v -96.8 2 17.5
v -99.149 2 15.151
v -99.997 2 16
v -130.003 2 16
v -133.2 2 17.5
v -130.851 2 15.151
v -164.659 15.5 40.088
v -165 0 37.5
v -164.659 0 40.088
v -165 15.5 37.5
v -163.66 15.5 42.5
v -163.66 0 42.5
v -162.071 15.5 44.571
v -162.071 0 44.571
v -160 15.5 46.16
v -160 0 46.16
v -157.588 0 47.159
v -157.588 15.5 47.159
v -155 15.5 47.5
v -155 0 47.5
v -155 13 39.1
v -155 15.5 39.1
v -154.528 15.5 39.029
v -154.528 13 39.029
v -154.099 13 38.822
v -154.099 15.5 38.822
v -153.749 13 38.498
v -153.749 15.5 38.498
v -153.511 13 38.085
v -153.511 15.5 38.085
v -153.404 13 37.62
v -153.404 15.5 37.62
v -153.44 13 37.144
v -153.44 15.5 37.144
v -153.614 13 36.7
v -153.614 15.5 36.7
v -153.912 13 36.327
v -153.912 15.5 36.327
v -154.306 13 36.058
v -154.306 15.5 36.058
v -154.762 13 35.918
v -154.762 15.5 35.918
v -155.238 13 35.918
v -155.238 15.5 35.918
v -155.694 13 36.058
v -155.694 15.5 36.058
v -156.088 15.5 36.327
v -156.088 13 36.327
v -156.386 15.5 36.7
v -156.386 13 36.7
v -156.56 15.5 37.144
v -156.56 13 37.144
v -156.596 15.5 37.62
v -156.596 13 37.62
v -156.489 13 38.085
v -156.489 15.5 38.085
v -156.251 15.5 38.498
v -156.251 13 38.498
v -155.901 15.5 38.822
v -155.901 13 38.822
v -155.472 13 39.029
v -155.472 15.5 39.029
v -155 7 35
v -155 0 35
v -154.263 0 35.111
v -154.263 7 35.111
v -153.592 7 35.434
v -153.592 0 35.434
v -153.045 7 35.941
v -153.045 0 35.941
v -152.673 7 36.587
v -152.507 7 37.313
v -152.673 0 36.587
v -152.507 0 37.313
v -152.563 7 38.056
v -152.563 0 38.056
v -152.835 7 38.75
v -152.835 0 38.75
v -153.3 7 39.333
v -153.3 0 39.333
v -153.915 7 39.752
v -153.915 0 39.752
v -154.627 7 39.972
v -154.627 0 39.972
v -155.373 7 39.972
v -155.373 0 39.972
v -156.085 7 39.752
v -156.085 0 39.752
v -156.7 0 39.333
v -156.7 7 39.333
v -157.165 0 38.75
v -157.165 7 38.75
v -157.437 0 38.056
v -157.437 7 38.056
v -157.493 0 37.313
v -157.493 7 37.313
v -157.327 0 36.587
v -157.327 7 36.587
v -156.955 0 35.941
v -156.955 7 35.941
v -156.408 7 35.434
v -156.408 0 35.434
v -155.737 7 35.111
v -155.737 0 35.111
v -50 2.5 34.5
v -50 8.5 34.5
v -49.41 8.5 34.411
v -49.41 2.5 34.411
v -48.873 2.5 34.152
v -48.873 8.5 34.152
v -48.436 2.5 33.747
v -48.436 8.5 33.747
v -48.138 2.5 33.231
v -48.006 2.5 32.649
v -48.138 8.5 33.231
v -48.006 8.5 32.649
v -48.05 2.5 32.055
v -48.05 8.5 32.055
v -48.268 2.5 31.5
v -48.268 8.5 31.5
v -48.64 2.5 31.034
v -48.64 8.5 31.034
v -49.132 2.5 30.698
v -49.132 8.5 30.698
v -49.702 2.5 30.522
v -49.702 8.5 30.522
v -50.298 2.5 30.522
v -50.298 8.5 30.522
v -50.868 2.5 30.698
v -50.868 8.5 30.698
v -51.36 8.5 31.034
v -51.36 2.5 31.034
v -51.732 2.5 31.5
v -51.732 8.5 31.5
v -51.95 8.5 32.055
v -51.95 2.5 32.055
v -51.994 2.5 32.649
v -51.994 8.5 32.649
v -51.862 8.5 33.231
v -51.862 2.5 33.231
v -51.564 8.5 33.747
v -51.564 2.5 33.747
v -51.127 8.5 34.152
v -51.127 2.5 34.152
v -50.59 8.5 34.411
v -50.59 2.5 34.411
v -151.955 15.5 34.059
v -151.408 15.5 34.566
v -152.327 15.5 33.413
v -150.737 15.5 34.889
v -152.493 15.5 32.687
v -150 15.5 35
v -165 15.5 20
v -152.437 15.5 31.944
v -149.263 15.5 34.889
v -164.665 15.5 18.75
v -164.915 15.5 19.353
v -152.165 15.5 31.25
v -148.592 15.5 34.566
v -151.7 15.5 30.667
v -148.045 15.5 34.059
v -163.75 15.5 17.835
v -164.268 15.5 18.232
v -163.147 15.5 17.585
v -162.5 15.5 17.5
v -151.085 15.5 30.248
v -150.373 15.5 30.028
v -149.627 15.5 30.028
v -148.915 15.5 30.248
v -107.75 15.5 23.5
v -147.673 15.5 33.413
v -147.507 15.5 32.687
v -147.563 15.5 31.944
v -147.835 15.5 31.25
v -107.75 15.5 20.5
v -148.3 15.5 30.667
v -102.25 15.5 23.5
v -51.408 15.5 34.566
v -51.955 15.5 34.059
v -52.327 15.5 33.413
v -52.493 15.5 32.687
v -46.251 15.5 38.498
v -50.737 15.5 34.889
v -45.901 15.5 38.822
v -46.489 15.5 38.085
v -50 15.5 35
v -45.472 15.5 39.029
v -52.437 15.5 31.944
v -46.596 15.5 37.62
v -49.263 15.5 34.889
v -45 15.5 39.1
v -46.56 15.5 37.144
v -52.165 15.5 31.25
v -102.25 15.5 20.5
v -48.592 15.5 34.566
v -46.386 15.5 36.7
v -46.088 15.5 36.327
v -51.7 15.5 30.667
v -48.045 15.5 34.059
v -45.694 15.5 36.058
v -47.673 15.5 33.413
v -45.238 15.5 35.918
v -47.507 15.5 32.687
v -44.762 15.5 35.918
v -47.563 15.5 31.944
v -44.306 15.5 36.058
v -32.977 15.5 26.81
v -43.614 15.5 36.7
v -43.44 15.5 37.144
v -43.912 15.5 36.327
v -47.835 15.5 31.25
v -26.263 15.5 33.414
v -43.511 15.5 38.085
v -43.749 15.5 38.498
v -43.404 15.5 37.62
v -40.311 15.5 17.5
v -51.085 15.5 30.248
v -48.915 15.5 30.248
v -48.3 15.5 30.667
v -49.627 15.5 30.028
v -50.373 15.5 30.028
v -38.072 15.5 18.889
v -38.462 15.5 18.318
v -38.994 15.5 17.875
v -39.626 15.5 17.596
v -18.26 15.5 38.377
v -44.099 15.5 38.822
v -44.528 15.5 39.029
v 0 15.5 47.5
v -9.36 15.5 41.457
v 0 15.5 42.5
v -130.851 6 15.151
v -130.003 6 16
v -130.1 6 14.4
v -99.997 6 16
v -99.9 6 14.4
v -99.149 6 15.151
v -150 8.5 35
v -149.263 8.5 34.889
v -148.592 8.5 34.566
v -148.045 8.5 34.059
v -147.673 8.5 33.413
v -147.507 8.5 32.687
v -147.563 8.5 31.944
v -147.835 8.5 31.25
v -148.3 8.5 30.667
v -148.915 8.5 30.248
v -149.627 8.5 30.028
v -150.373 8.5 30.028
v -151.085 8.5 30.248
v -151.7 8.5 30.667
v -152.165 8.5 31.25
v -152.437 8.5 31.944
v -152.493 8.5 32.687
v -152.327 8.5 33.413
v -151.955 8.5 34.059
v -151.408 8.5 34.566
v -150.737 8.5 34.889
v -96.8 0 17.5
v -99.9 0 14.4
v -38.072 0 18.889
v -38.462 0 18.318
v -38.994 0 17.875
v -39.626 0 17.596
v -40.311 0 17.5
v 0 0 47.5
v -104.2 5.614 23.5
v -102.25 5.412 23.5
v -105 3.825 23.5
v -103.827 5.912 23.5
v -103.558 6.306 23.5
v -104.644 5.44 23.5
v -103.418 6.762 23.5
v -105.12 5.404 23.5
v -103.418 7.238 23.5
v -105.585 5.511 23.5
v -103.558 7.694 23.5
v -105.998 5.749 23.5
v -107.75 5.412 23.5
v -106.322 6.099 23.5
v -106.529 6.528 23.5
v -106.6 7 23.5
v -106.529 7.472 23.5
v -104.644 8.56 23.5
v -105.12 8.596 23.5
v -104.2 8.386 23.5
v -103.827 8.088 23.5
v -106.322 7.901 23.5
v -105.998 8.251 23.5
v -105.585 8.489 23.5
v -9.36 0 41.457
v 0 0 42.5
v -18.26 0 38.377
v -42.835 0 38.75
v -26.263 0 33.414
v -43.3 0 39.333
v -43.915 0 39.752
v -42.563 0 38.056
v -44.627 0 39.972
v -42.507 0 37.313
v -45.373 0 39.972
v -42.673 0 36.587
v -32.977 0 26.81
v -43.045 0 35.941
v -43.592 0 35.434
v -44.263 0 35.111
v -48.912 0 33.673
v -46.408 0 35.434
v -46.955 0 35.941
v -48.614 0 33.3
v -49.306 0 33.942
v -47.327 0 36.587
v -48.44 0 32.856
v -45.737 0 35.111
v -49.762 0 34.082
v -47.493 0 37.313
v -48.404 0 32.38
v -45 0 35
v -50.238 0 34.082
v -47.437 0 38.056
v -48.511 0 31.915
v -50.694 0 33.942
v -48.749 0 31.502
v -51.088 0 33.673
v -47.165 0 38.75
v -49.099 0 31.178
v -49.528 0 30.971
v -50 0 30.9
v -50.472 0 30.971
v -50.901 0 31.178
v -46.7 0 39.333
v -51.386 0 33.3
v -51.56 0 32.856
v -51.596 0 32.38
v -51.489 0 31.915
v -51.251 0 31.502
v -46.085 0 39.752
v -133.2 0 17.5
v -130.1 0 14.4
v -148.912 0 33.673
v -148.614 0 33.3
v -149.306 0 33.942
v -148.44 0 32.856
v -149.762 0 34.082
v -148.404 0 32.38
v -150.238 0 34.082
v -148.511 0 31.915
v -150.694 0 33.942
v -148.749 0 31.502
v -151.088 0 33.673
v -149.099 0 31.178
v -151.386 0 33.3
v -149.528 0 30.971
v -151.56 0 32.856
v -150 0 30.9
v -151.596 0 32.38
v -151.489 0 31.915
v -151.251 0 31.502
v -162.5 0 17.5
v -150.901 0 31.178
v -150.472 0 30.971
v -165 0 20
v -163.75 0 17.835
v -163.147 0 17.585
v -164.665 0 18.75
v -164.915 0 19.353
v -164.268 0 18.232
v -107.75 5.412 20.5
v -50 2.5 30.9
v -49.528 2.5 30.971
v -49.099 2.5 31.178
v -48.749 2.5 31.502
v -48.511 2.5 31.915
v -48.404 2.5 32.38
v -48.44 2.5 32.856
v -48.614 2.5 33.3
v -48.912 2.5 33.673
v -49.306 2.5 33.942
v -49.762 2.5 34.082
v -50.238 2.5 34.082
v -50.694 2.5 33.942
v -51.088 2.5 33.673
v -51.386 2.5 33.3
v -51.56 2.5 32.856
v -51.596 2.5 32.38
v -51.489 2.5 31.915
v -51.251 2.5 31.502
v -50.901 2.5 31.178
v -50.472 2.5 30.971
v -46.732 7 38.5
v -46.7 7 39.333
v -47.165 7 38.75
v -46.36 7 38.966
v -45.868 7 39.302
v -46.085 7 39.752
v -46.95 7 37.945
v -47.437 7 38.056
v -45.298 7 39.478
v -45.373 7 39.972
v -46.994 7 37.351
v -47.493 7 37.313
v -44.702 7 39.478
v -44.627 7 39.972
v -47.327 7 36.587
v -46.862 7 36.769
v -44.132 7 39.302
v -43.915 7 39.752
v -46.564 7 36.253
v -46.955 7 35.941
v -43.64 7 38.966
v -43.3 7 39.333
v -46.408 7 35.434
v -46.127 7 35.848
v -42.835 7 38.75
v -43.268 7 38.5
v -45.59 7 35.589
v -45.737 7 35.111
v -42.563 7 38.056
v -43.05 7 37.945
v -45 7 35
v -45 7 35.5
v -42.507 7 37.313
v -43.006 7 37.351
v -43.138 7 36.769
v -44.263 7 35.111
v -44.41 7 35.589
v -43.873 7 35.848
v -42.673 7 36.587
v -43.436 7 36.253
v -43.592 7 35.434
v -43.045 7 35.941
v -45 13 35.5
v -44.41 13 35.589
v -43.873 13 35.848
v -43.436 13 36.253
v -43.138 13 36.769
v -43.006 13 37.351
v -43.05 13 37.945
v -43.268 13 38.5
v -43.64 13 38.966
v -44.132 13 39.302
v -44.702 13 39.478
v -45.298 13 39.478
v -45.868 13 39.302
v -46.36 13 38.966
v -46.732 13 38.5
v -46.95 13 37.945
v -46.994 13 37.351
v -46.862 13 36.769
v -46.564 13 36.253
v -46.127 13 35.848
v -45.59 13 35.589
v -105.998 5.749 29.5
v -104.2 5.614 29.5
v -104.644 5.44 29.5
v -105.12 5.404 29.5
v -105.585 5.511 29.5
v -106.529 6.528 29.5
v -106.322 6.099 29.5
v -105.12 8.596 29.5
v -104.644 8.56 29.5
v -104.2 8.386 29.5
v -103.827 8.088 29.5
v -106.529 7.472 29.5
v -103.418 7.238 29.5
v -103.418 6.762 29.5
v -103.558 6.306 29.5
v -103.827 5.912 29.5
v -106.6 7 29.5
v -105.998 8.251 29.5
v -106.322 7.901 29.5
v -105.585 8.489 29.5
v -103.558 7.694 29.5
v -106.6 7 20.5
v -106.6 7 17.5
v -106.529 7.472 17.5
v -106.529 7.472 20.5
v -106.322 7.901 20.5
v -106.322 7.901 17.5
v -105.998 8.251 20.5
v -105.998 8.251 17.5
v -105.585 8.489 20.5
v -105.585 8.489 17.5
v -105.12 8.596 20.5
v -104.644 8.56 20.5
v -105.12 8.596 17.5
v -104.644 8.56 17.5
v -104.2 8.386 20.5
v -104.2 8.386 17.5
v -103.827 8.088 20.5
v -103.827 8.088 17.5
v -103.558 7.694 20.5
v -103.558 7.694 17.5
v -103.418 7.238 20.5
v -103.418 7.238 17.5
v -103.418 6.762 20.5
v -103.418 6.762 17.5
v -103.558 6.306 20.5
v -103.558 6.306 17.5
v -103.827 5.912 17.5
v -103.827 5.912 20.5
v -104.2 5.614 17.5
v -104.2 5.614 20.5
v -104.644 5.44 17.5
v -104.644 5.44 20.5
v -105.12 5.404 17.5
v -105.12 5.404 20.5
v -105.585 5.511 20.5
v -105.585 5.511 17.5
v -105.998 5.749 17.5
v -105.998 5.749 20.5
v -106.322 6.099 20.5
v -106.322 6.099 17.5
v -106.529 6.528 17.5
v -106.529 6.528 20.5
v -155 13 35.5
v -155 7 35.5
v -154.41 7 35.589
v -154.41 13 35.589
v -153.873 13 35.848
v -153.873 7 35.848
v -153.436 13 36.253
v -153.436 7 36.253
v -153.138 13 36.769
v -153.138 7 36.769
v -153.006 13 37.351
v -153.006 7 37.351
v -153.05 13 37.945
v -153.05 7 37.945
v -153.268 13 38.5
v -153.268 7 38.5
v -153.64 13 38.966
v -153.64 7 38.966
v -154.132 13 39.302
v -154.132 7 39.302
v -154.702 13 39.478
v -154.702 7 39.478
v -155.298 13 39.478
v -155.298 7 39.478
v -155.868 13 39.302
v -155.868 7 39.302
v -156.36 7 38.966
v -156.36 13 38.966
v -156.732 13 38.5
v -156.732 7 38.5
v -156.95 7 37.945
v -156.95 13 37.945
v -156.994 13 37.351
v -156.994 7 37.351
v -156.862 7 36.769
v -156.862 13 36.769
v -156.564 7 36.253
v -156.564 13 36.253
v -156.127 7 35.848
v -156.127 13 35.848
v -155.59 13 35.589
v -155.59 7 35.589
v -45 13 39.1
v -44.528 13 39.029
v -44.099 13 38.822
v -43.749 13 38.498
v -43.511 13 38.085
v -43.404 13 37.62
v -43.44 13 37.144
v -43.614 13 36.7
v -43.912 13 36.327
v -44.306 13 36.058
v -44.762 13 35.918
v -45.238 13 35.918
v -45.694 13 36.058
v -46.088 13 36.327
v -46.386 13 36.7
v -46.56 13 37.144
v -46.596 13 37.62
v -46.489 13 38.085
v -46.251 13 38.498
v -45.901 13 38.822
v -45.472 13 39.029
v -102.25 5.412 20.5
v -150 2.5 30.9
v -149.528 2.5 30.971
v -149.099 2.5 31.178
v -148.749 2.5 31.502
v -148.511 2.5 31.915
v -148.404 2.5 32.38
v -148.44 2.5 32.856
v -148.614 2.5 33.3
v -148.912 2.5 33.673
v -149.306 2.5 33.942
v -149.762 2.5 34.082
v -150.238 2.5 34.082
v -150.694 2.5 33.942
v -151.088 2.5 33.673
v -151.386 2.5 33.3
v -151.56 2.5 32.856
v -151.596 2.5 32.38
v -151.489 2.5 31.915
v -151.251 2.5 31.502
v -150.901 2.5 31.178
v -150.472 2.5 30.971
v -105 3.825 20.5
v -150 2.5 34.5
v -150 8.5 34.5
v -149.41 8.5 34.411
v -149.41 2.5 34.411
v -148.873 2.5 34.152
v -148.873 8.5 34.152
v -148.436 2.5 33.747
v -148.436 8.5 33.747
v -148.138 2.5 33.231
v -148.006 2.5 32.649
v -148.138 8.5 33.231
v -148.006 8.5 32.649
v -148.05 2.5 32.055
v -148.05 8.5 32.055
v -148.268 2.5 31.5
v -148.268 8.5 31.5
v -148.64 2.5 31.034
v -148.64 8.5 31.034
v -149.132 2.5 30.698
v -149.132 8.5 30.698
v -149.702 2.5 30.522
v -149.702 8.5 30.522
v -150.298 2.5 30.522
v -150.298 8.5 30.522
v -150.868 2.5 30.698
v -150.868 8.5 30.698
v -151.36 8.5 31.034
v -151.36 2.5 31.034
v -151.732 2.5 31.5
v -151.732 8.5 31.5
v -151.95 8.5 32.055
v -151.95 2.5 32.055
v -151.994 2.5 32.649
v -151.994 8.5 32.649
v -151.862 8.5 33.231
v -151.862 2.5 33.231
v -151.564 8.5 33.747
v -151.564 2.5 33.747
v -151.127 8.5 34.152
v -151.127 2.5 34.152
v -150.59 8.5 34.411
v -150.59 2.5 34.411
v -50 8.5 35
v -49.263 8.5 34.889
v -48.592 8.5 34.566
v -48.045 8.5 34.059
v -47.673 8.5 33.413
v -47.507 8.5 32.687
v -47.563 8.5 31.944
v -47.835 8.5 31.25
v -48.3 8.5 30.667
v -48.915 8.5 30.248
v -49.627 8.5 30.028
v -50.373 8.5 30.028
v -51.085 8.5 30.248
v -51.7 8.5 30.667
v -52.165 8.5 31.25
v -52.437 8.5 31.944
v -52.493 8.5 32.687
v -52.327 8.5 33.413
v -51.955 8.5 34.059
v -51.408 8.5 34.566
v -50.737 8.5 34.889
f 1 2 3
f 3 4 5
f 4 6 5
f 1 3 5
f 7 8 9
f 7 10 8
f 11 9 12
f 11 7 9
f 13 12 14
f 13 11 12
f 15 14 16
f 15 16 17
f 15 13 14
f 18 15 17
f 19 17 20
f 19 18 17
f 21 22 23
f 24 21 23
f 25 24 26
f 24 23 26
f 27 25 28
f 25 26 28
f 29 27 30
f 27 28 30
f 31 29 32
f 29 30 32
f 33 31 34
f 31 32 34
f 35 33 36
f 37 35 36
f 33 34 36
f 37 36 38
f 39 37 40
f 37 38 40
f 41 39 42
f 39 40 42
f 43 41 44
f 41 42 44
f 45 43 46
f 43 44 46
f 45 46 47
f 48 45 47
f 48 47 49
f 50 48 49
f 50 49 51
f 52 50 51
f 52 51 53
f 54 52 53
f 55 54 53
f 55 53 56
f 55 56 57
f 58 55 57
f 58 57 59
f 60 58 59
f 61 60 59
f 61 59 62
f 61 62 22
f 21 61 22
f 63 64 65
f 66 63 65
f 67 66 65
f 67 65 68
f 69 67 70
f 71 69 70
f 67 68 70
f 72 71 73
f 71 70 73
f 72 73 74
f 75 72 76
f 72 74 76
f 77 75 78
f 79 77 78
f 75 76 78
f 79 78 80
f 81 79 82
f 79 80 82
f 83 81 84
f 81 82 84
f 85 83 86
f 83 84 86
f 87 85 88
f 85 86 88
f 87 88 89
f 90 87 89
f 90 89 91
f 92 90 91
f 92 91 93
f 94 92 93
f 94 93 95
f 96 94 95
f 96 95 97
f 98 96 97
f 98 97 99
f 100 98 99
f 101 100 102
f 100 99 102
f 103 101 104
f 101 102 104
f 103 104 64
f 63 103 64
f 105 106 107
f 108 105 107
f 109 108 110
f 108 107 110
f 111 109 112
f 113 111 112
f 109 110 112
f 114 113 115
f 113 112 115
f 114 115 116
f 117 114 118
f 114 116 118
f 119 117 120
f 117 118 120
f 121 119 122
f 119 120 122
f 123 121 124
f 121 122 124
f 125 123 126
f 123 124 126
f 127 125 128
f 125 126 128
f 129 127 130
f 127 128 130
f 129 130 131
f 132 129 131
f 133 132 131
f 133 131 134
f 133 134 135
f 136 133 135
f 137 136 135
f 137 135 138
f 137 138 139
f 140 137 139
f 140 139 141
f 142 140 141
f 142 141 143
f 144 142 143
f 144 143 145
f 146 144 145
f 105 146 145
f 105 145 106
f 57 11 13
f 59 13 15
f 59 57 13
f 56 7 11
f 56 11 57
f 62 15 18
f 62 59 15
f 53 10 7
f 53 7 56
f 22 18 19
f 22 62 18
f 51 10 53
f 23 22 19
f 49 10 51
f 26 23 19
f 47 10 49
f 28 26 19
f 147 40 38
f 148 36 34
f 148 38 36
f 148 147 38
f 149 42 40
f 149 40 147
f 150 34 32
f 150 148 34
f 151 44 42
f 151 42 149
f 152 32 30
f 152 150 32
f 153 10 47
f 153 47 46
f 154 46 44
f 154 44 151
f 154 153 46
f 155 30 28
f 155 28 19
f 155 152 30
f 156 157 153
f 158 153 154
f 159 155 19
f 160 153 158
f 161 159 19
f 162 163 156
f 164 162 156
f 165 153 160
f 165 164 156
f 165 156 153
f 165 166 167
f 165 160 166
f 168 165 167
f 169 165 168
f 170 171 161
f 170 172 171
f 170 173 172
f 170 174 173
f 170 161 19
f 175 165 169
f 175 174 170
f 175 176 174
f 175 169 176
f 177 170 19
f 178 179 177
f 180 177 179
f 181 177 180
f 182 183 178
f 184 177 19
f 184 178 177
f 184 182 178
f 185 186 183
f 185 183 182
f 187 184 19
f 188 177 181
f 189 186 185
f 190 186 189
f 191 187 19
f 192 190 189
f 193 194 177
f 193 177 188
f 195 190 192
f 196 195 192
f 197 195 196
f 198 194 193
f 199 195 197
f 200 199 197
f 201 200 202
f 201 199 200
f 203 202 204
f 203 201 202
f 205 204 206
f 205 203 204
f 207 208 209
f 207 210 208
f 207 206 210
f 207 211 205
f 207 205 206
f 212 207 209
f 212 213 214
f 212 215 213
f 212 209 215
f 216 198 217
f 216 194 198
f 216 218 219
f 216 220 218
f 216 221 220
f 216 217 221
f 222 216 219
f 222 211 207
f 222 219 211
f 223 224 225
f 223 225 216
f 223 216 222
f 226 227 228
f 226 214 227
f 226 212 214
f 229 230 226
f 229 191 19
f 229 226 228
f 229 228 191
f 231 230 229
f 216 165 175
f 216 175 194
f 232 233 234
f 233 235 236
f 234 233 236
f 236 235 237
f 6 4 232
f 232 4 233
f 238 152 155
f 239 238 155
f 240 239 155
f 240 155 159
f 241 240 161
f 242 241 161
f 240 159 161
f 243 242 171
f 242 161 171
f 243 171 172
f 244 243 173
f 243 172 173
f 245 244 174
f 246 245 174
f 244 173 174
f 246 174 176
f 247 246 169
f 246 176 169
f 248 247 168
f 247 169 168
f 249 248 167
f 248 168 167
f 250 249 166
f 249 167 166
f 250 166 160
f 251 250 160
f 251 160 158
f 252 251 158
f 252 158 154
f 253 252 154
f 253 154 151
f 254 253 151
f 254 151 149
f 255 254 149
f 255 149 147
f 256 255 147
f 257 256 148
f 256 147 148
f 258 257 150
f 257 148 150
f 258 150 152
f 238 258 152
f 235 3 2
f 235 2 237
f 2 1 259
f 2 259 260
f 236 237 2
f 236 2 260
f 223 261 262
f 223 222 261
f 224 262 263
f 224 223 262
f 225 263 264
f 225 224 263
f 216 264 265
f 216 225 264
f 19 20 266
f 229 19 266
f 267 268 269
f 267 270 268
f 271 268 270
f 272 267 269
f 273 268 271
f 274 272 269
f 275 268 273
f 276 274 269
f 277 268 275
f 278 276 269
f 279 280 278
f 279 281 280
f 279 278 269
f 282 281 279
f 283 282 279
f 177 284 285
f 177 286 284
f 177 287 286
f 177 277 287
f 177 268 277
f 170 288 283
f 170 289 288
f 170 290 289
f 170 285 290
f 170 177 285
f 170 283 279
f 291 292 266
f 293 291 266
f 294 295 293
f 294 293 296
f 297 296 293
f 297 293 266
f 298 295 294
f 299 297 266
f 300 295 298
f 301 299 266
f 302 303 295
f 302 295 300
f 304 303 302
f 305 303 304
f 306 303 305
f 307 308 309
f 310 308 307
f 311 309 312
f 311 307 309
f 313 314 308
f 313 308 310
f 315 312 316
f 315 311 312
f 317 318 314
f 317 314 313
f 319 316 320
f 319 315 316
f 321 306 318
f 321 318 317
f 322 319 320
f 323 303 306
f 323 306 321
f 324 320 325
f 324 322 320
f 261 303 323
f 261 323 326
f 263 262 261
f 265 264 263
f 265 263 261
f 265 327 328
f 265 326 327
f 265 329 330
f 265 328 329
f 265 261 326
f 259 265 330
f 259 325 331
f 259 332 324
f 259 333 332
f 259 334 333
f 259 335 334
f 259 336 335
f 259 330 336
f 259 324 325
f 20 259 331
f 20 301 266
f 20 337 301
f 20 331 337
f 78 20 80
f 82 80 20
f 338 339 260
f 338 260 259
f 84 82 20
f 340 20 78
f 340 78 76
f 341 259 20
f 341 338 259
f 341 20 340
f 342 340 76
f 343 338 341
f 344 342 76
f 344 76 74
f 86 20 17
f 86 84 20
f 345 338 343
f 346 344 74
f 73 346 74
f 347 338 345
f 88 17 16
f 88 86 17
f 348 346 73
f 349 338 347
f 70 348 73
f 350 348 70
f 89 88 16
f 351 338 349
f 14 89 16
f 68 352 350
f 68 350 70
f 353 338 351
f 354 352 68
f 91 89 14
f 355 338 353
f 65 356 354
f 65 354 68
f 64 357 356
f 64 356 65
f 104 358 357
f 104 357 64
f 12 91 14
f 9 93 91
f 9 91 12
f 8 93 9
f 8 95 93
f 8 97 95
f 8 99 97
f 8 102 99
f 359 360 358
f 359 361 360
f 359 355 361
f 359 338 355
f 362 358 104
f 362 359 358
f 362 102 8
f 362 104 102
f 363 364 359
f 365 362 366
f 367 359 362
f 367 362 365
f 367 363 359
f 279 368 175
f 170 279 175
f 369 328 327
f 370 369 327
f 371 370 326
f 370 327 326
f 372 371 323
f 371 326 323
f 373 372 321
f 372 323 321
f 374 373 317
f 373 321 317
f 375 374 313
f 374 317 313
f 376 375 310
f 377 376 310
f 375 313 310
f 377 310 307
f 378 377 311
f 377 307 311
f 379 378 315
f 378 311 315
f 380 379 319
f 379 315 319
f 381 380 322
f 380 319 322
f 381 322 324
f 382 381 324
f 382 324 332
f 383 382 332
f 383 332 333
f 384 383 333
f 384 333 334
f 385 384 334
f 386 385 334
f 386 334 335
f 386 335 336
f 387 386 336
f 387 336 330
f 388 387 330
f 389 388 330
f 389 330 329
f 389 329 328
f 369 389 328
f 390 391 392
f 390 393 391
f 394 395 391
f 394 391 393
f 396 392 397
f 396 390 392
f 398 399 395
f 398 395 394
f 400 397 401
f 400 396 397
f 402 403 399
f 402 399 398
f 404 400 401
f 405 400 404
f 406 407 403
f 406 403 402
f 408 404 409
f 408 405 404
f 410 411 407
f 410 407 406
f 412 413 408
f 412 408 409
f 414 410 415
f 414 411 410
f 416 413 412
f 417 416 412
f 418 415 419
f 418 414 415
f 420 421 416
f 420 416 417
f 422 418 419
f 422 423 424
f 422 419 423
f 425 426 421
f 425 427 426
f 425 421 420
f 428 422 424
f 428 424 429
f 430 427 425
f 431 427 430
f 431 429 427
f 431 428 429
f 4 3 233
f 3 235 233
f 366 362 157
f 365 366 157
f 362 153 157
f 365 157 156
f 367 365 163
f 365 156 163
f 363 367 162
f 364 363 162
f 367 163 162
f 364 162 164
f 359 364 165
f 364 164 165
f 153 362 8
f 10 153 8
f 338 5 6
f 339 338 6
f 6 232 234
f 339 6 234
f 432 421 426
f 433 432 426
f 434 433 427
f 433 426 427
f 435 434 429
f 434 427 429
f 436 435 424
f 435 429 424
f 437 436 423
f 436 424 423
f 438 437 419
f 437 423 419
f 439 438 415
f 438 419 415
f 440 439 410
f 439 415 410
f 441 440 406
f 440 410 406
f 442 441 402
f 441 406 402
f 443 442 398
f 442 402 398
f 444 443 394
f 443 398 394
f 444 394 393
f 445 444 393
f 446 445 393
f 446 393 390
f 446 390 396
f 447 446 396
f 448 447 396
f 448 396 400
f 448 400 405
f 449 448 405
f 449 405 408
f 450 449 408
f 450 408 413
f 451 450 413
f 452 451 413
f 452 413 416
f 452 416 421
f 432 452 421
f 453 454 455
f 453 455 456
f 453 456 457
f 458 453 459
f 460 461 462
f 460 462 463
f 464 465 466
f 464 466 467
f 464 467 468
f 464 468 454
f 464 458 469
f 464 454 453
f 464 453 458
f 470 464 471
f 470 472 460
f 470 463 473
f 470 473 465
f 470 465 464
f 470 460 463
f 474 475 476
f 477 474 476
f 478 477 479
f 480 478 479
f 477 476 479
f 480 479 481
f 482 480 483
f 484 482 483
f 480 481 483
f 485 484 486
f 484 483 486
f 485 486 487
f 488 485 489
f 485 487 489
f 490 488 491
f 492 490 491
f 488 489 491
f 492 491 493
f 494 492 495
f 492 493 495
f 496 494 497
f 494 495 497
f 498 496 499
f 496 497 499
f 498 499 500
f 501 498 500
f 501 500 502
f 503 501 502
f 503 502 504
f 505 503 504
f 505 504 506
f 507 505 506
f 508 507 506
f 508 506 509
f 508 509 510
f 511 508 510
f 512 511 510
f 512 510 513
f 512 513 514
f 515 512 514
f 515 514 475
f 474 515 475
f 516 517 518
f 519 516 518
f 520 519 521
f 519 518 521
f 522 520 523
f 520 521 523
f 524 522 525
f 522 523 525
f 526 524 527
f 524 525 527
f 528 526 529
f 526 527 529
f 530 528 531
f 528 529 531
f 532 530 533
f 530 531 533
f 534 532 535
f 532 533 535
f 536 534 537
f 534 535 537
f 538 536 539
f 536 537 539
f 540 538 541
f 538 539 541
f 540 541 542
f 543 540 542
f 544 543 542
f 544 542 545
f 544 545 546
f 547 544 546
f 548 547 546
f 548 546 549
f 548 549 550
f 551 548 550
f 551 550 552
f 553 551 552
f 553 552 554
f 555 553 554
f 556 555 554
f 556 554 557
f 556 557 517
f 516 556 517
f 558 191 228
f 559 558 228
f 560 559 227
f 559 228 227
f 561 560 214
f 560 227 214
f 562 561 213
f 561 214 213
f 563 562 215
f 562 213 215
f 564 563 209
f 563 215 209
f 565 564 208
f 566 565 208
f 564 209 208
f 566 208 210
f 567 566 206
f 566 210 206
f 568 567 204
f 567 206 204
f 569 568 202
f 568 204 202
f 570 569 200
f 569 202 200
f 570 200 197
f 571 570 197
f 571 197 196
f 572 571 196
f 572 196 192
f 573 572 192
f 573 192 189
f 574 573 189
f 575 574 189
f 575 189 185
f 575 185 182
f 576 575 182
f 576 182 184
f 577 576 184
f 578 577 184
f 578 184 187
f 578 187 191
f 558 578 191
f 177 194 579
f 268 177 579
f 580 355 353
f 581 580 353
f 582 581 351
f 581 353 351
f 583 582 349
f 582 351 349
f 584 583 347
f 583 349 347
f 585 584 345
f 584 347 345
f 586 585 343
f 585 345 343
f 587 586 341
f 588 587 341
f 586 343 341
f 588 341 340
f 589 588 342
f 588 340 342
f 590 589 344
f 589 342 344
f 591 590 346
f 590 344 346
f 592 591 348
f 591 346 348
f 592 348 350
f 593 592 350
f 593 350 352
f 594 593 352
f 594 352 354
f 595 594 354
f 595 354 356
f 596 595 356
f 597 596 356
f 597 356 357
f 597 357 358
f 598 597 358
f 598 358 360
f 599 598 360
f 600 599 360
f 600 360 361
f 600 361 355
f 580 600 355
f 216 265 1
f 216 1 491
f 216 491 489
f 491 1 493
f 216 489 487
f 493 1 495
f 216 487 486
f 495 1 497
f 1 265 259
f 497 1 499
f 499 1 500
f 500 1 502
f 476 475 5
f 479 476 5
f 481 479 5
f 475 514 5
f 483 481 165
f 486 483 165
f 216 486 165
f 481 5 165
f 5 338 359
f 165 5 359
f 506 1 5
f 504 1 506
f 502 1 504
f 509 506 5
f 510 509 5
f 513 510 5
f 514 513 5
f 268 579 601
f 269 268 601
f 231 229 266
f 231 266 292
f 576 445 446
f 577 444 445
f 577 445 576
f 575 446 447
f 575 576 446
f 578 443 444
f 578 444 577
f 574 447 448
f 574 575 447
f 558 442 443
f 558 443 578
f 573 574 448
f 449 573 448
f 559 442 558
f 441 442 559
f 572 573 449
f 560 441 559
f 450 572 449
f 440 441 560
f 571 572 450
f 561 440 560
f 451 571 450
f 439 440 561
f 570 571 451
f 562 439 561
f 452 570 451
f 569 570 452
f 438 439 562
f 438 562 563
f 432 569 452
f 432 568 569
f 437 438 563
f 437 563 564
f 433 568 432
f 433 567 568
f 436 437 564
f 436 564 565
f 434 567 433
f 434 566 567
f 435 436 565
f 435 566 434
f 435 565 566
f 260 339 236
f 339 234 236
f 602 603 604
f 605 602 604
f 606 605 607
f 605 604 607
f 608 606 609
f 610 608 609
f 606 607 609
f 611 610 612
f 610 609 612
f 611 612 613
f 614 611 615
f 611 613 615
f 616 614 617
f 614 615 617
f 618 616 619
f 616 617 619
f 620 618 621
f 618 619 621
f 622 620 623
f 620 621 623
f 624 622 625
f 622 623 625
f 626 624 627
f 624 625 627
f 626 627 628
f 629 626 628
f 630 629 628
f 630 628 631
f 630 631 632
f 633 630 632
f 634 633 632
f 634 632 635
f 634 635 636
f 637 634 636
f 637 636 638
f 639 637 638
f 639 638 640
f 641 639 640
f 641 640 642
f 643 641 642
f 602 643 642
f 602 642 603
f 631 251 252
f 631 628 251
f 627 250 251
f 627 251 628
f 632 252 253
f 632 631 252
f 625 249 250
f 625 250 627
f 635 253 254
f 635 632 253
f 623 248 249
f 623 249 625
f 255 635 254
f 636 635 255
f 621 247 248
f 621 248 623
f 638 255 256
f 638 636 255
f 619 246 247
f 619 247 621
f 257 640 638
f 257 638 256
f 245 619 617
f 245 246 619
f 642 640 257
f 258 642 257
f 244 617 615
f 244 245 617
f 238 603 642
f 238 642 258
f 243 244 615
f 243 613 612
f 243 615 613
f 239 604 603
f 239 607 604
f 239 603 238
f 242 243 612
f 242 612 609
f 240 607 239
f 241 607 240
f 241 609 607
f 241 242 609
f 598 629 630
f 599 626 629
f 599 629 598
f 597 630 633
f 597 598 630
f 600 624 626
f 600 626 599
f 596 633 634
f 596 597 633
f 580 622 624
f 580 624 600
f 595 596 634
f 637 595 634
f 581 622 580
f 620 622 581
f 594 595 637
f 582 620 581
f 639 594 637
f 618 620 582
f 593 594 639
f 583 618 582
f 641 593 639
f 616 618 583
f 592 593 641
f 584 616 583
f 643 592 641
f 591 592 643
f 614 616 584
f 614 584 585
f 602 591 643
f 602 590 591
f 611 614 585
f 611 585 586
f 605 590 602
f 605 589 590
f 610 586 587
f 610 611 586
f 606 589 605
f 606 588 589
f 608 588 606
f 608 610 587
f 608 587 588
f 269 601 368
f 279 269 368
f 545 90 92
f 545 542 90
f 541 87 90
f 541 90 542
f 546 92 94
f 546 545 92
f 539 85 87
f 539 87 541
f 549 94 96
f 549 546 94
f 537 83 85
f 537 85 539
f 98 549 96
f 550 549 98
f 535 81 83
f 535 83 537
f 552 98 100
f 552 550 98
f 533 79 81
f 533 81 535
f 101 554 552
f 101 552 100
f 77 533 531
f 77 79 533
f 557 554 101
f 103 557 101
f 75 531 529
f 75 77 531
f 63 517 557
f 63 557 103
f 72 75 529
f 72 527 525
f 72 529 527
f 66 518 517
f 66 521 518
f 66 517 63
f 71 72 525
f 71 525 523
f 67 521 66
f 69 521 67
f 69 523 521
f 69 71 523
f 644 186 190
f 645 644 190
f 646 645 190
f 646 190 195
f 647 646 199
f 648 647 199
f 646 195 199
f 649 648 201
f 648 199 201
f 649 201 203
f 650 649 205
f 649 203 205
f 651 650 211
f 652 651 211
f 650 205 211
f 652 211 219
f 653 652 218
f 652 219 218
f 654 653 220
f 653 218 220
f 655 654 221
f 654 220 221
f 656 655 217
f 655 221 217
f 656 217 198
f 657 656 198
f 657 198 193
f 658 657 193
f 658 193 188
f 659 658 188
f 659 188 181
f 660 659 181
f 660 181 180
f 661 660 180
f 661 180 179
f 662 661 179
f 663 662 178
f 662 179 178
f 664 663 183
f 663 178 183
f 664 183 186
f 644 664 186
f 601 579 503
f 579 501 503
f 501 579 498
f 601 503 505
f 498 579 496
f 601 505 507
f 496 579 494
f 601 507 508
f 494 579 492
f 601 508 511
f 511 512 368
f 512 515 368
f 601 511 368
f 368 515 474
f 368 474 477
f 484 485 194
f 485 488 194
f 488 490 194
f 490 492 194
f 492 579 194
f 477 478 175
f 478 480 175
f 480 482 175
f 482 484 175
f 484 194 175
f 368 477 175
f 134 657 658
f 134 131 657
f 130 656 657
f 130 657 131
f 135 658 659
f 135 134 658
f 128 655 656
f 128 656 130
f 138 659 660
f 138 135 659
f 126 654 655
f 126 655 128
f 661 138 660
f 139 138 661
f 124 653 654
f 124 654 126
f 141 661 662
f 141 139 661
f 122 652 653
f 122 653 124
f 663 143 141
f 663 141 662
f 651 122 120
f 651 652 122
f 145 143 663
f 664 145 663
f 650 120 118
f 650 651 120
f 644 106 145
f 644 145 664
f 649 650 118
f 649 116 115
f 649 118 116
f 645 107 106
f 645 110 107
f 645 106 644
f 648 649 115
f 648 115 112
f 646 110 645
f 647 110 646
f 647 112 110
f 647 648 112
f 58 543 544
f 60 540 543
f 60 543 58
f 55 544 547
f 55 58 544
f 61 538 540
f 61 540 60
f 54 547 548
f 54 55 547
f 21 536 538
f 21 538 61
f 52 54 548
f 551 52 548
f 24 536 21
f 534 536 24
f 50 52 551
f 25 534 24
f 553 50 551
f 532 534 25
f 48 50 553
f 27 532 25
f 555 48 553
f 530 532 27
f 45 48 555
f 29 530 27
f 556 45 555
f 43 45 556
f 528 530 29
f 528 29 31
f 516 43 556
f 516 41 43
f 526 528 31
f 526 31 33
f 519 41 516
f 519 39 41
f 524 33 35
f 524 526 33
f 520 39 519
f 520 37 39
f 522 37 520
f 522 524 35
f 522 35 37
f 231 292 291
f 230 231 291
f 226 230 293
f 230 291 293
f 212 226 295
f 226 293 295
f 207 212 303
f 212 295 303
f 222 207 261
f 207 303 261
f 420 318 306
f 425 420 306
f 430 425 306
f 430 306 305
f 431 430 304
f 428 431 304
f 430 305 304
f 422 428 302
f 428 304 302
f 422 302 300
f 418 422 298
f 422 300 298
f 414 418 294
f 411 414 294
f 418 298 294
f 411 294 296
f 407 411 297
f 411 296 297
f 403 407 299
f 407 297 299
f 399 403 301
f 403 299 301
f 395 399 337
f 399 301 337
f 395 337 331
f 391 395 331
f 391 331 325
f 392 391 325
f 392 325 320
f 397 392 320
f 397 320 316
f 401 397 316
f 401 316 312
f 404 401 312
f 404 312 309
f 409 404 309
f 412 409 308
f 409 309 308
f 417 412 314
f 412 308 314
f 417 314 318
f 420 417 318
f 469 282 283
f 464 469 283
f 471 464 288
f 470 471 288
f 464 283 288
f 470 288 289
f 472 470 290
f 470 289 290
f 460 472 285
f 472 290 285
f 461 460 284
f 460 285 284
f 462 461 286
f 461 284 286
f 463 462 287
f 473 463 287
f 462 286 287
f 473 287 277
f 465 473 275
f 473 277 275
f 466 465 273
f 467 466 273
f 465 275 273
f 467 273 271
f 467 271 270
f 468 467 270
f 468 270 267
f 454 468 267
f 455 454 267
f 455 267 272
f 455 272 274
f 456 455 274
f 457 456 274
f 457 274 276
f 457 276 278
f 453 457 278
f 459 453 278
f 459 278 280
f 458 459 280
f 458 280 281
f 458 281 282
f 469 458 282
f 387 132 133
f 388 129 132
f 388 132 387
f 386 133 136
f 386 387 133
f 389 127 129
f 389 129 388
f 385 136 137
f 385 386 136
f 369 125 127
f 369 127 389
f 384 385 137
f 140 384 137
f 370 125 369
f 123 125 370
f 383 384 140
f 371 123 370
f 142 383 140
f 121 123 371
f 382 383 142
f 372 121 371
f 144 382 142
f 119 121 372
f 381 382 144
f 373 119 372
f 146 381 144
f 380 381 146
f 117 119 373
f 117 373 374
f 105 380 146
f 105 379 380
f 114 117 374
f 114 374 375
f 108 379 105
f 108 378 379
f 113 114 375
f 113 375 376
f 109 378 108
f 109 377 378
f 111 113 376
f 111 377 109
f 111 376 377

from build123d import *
from OCP.BRepFilletAPI import BRepFilletAPI_MakeChamfer, BRepFilletAPI_MakeFillet

# Parameters (mm, degrees)
BOSS_EXTRU_1_DEPTH      = 15.5
BOSS_EXTRU_2_START      = -35
BOSS_EXTRU_2_DEPTH      = 30
CHANFREIN1_SIZE         = 3.2
CHANFREIN2_SIZE         = 1.2
CHANFREIN2_SIZE2        = 1.697056275
CONG_1_R1               = 10
CONG_1_R2               = 2.5
ENL_V_MAT_EXTRU_1_REACH = 174.399
ESQUISSE3_R             = 1.6
ESQUISSE4_R             = 2
ENL_V_MAT_EXTRU_2_DEPTH = 13
ESQUISSE9_R             = 2.5
ENL_V_MAT_EXTRU_7_DEPTH = 7
ENL_V_MAT_EXTRU_3_REACH = 174.399
ESQUISSE5_R             = 1.6
ESQUISSE6_R             = 2
ENL_V_MAT_EXTRU_4_DEPTH = 13
ESQUISSE10_R            = 2.5
ENL_V_MAT_EXTRU_8_DEPTH = 7
ESQUISSE7_R             = 1.6
ENL_V_MAT_EXTRU_5_DEPTH = 12
ENL_V_START             = -3
ENL_V_MAT_EXTRU_6_DEPTH = 3


with BuildPart() as part:
    # Esquisse1 → Boss.-Extru.1 (new body)
    with BuildSketch(Plane(origin=(0, 0, 0), x_dir=(1, 0, 0), z_dir=(0, 1, 0))):
        with BuildLine():
            ThreePointArc((0, -42.5), (-23.048861143, -35.707142143), (-38.729833462, -17.5))
            Line((-38.729833462, -17.5), (-165, -17.5))
            Line((-165, -17.5), (-165, -47.5))
            Line((-165, -47.5), (0, -47.5))
            Line((0, -47.5), (0, -42.5))
        make_face()
    extrude(amount=BOSS_EXTRU_1_DEPTH)

    # Esquisse11 → Boss.-Extru.2 (add)
    with BuildSketch(Plane.ZY.offset(165).offset(BOSS_EXTRU_2_START)):
        Polygon((17.5, 0), (14.4, 0), (14.4, 6), (16, 6), (16, 2), (17.5, 2), align=None)
    extrude(amount=-BOSS_EXTRU_2_DEPTH)

    # Chanfrein1
    # the kernel refuses this chamfer: 3.2 mm, written as the material it adds along each edge
    with BuildSketch(Plane(origin=(-100, 10.229385561, 17.5), x_dir=(0.9996219169112968, 0, 0.027495876610586226), z_dir=(0, -1, 0))) as chanfrein1_piece_1_section:
        Polygon((CHANFREIN1_SIZE * 0.999621916911, -CHANFREIN1_SIZE * 0.0274958766106), (-CHANFREIN1_SIZE * 0.0274958766106, -CHANFREIN1_SIZE * 0.999621916911), (0, 0), align=None)
    chanfrein1_piece_1 = extrude(amount=10.229385561, mode=Mode.PRIVATE)
    chanfrein1_piece_1 = split(chanfrein1_piece_1, bisect_by=Plane(origin=(-99.489179746, 2, 15.404286374), z_dir=(0, 1, 0)), keep=Keep.TOP, mode=Mode.PRIVATE)
    chanfrein1_piece_1 = split(chanfrein1_piece_1, bisect_by=Plane(origin=(-99.489179746, 4, 14.4), z_dir=(0, 0, 1)), keep=Keep.TOP, mode=Mode.PRIVATE)
    chanfrein1_piece_1 = split(chanfrein1_piece_1, bisect_by=Plane(origin=(-99.489179746, 6, 15.404286374), z_dir=(0, -1, 0)), keep=Keep.TOP, mode=Mode.PRIVATE)
    chanfrein1_piece_1 = split(chanfrein1_piece_1, bisect_by=Plane(origin=(-99.489179746, 4, 16), z_dir=(0, 0, -1)), keep=Keep.TOP, mode=Mode.PRIVATE)
    add(chanfrein1_piece_1)
    with BuildSketch(Plane(origin=(-100, 2, 17.5), x_dir=(0.9996219169112968, 0, 0.027495876610585147), z_dir=(0, -1, 0))) as chanfrein1_piece_2_section:
        Polygon((CHANFREIN1_SIZE * 0.999621916911, -CHANFREIN1_SIZE * 0.0274958766106), (-CHANFREIN1_SIZE * 0.0274958766106, -CHANFREIN1_SIZE * 0.999621916911), (0, 0), align=None)
    chanfrein1_piece_2 = extrude(amount=2, mode=Mode.PRIVATE)
    chanfrein1_piece_2 = split(chanfrein1_piece_2, bisect_by=Plane(origin=(-98.721329155, 1, 16), z_dir=(0, 0, 1)), keep=Keep.TOP, mode=Mode.PRIVATE)
    add(chanfrein1_piece_2)
    with BuildSketch(Plane(origin=(-100, 2, 17.5), x_dir=(0.9996219169112968, 0, 0.027495876610585147), z_dir=(0, -1, 0))) as chanfrein1_piece_3_section:
        Polygon((CHANFREIN1_SIZE * 0.999621916911, -CHANFREIN1_SIZE * 0.0274958766106), (-CHANFREIN1_SIZE * 0.0274958766106, -CHANFREIN1_SIZE * 0.999621916911), (0, 0), align=None)
    chanfrein1_piece_3 = extrude(amount=2, mode=Mode.PRIVATE)
    chanfrein1_piece_3 = split(chanfrein1_piece_3, bisect_by=Plane(origin=(-99.489179746, 1, 14.4), z_dir=(0, 0, 1)), keep=Keep.TOP, mode=Mode.PRIVATE)
    chanfrein1_piece_3 = split(chanfrein1_piece_3, bisect_by=Plane(origin=(-99.489179746, 1, 16), z_dir=(0, 0, -1)), keep=Keep.TOP, mode=Mode.PRIVATE)
    add(chanfrein1_piece_3)
    with BuildSketch(Plane(origin=(-130, 10.229385561, 17.5), x_dir=(-0.9996219169112966, 0, 0.02749587661058634), z_dir=(0, -1, 0))) as chanfrein1_piece_4_section:
        Polygon((CHANFREIN1_SIZE * 0.999621916911, CHANFREIN1_SIZE * 0.0274958766106), (-CHANFREIN1_SIZE * 0.0274958766106, CHANFREIN1_SIZE * 0.999621916911), (0, 0), align=None)
    chanfrein1_piece_4 = extrude(amount=10.229385561, mode=Mode.PRIVATE)
    chanfrein1_piece_4 = split(chanfrein1_piece_4, bisect_by=Plane(origin=(-130.510820254, 2, 15.404286374), z_dir=(0, 1, 0)), keep=Keep.TOP, mode=Mode.PRIVATE)
    chanfrein1_piece_4 = split(chanfrein1_piece_4, bisect_by=Plane(origin=(-130.510820254, 4, 14.4), z_dir=(0, 0, 1)), keep=Keep.TOP, mode=Mode.PRIVATE)
    chanfrein1_piece_4 = split(chanfrein1_piece_4, bisect_by=Plane(origin=(-130.510820254, 6, 15.404286374), z_dir=(0, -1, 0)), keep=Keep.TOP, mode=Mode.PRIVATE)
    chanfrein1_piece_4 = split(chanfrein1_piece_4, bisect_by=Plane(origin=(-130.510820254, 4, 16), z_dir=(0, 0, -1)), keep=Keep.TOP, mode=Mode.PRIVATE)
    add(chanfrein1_piece_4)
    with BuildSketch(Plane(origin=(-130, 2, 17.5), x_dir=(-0.9996219169112966, 0, 0.027495876610585262), z_dir=(0, -1, 0))) as chanfrein1_piece_5_section:
        Polygon((CHANFREIN1_SIZE * 0.999621916911, CHANFREIN1_SIZE * 0.0274958766106), (-CHANFREIN1_SIZE * 0.0274958766106, CHANFREIN1_SIZE * 0.999621916911), (0, 0), align=None)
    chanfrein1_piece_5 = extrude(amount=2, mode=Mode.PRIVATE)
    chanfrein1_piece_5 = split(chanfrein1_piece_5, bisect_by=Plane(origin=(-131.278670845, 1, 16), z_dir=(0, 0, 1)), keep=Keep.TOP, mode=Mode.PRIVATE)
    add(chanfrein1_piece_5)
    with BuildSketch(Plane(origin=(-130, 2, 17.5), x_dir=(-0.9996219169112966, 0, 0.027495876610585262), z_dir=(0, -1, 0))) as chanfrein1_piece_6_section:
        Polygon((CHANFREIN1_SIZE * 0.999621916911, CHANFREIN1_SIZE * 0.0274958766106), (-CHANFREIN1_SIZE * 0.0274958766106, CHANFREIN1_SIZE * 0.999621916911), (0, 0), align=None)
    chanfrein1_piece_6 = extrude(amount=2, mode=Mode.PRIVATE)
    chanfrein1_piece_6 = split(chanfrein1_piece_6, bisect_by=Plane(origin=(-130.510820254, 1, 14.4), z_dir=(0, 0, 1)), keep=Keep.TOP, mode=Mode.PRIVATE)
    chanfrein1_piece_6 = split(chanfrein1_piece_6, bisect_by=Plane(origin=(-130.510820254, 1, 16), z_dir=(0, 0, -1)), keep=Keep.TOP, mode=Mode.PRIVATE)
    add(chanfrein1_piece_6)

    # Chanfrein2: one chamfer whose edges measure the first distance from different faces: ONE call of the kernel's chamfer builder (chamfer() names one face for all edges)
    chanfrein2_edges_1 = [part.edges().sort_by_distance(p)[0] for p in [
        (-98.3, 4, 16),
    ]]
    chanfrein2_side_1 = [part.faces().sort_by_distance(p)[0] for p in [
        (-98.730952381, 2.523809524, 15.569047619),
    ]]
    chanfrein2_edges_2 = [part.edges().sort_by_distance(p)[0] for p in [
        (-131.7, 4, 16),
    ]]
    chanfrein2_side_2 = [part.faces().sort_by_distance(p)[0] for p in [
        (-131.269047619, 2.523809524, 15.569047619),
    ]]
    chanfrein2 = BRepFilletAPI_MakeChamfer(part.part.solid().wrapped)
    for e in chanfrein2_edges_1:
        chanfrein2.Add(CHANFREIN2_SIZE, CHANFREIN2_SIZE2, e.wrapped, chanfrein2_side_1[0].wrapped)  # the first distance lies on this face
    for e in chanfrein2_edges_2:
        chanfrein2.Add(CHANFREIN2_SIZE, CHANFREIN2_SIZE2, e.wrapped, chanfrein2_side_2[0].wrapped)  # the first distance lies on this face
    add(Compound.cast(chanfrein2.Shape()), mode=Mode.REPLACE)

    # Congé1: one fillet with a radius per group of edges: ONE call of the kernel's fillet builder (fillet() takes one radius for all edges)
    cong_1_edges_1 = [part.edges().sort_by_distance(p)[0] for p in [
        (-165, 7.75, 47.5),
    ]]
    cong_1_edges_2 = [part.edges().sort_by_distance(p)[0] for p in [
        (-165, 7.75, 17.5),
        (-38.729833462, 7.75, 17.5),
    ]]
    cong_1 = BRepFilletAPI_MakeFillet(part.part.solid().wrapped)
    for e in cong_1_edges_1:
        cong_1.Add(CONG_1_R1, e.wrapped)
    for e in cong_1_edges_2:
        cong_1.Add(CONG_1_R2, e.wrapped)
    add(Compound.cast(cong_1.Shape()), mode=Mode.REPLACE)

    # Esquisse3 → Enlèv. mat.-Extru.1 (cut, up to next)
    with BuildSketch(Plane(origin=(0, 15.5, 0), x_dir=(1, 0, 0), z_dir=(0, 1, 0)), mode=Mode.PRIVATE) as enl_v_mat_extru_1_sk1:
        with Locations(Location((-155, -37.5, 0), (0, 0, 270))):
            Circle(ESQUISSE3_R)
    enl_v_mat_extru_1_tool1 = extrude(enl_v_mat_extru_1_sk1.sketch, amount=-ENL_V_MAT_EXTRU_1_REACH, mode=Mode.PRIVATE) & part.part
    # Esquisse3 → Enlèv. mat.-Extru.1 (cut, up to next)
    with BuildSketch(Plane(origin=(0, 15.5, 0), x_dir=(1, 0, 0), z_dir=(0, 1, 0)), mode=Mode.PRIVATE) as enl_v_mat_extru_1_sk2:
        with Locations(Location((-45, -37.5, 0), (0, 0, 270))):
            Circle(ESQUISSE3_R)
    enl_v_mat_extru_1_tool2 = extrude(enl_v_mat_extru_1_sk2.sketch, amount=-ENL_V_MAT_EXTRU_1_REACH, mode=Mode.PRIVATE) & part.part
    add(enl_v_mat_extru_1_tool1.solids().sort_by_distance((-155, 15.5, 37.5))[0], mode=Mode.SUBTRACT)
    add(enl_v_mat_extru_1_tool2.solids().sort_by_distance((-45, 15.5, 37.5))[0], mode=Mode.SUBTRACT)

    # Esquisse4 → Enlèv. mat.-Extru.2 (cut)
    with BuildSketch(Plane.XZ):
        with Locations(Location((-155, 37.5, 0), (0, 0, 270))):
            Circle(ESQUISSE4_R)
        with Locations(Location((-45, 37.5, 0), (0, 0, 270))):
            Circle(ESQUISSE4_R)
    extrude(amount=-ENL_V_MAT_EXTRU_2_DEPTH, mode=Mode.SUBTRACT)

    # Esquisse9 → Enlèv. mat.-Extru.7 (cut)
    with BuildSketch(Plane.XZ):
        with Locations(Location((-155, 37.5, 0), (0, 0, 270))):
            Circle(ESQUISSE9_R)
        with Locations(Location((-45, 37.5, 0), (0, 0, 270))):
            Circle(ESQUISSE9_R)
    extrude(amount=-ENL_V_MAT_EXTRU_7_DEPTH, mode=Mode.SUBTRACT)

    # Esquisse5 → Enlèv. mat.-Extru.3 (cut, up to next)
    with BuildSketch(Plane.XZ, mode=Mode.PRIVATE) as enl_v_mat_extru_3_sk1:
        with Locations(Location((-150, 32.5, 0), (0, 0, 270))):
            Circle(ESQUISSE5_R)
    enl_v_mat_extru_3_tool1 = extrude(enl_v_mat_extru_3_sk1.sketch, amount=-ENL_V_MAT_EXTRU_3_REACH, mode=Mode.PRIVATE) & part.part
    # Esquisse5 → Enlèv. mat.-Extru.3 (cut, up to next)
    with BuildSketch(Plane.XZ, mode=Mode.PRIVATE) as enl_v_mat_extru_3_sk2:
        with Locations(Location((-50, 32.5, 0), (0, 0, 270))):
            Circle(ESQUISSE5_R)
    enl_v_mat_extru_3_tool2 = extrude(enl_v_mat_extru_3_sk2.sketch, amount=-ENL_V_MAT_EXTRU_3_REACH, mode=Mode.PRIVATE) & part.part
    add(enl_v_mat_extru_3_tool1.solids().sort_by_distance((-150, 0, 32.5))[0], mode=Mode.SUBTRACT)
    add(enl_v_mat_extru_3_tool2.solids().sort_by_distance((-50, 0, 32.5))[0], mode=Mode.SUBTRACT)

    # Esquisse6 → Enlèv. mat.-Extru.4 (cut)
    with BuildSketch(Plane(origin=(0, 15.5, 0), x_dir=(1, 0, 0), z_dir=(0, 1, 0))):
        with Locations(Location((-150, -32.5, 0), (0, 0, 270))):
            Circle(ESQUISSE6_R)
        with Locations(Location((-50, -32.5, 0), (0, 0, 270))):
            Circle(ESQUISSE6_R)
    extrude(amount=-ENL_V_MAT_EXTRU_4_DEPTH, mode=Mode.SUBTRACT)

    # Esquisse10 → Enlèv. mat.-Extru.8 (cut)
    with BuildSketch(Plane(origin=(0, 15.5, 0), x_dir=(1, 0, 0), z_dir=(0, 1, 0))):
        with Locations(Location((-50, -32.5, 0), (0, 0, 270))):
            Circle(ESQUISSE10_R)
        with Locations(Location((-150, -32.5, 0), (0, 0, 270))):
            Circle(ESQUISSE10_R)
    extrude(amount=-ENL_V_MAT_EXTRU_8_DEPTH, mode=Mode.SUBTRACT)

    # Esquisse7 → Enlèv. mat.-Extru.5 (cut)
    with BuildSketch(Plane(origin=(0, 0, 17.5), x_dir=(-1, 0, 0), z_dir=(0, 0, -1))):
        with Locations((105, 7)):
            Circle(ESQUISSE7_R)
    extrude(amount=-ENL_V_MAT_EXTRU_5_DEPTH, mode=Mode.SUBTRACT)

    # Esquisse8 → Enlèv. mat.-Extru.6 (cut)
    with BuildSketch(Plane(origin=(0, 0, 17.5), x_dir=(-1, 0, 0), z_dir=(0, 0, -1)).offset(ENL_V_START)):
        Polygon((102.25, 5.41228676), (105, 3.824573519), (107.75, 5.41228676), (107.75, 8.58771324), (102.25, 8.58771324), align=None)
        Polygon((102.25, 8.58771324), (107.75, 8.58771324), (105, 10.175426481), align=None)
        Polygon((105, 10.175426481), (107.75, 8.58771324), (107.75, 15.5), (102.25, 15.5), (102.25, 8.58771324), align=None)
    extrude(amount=-ENL_V_MAT_EXTRU_6_DEPTH, mode=Mode.SUBTRACT)


solid = part.part
